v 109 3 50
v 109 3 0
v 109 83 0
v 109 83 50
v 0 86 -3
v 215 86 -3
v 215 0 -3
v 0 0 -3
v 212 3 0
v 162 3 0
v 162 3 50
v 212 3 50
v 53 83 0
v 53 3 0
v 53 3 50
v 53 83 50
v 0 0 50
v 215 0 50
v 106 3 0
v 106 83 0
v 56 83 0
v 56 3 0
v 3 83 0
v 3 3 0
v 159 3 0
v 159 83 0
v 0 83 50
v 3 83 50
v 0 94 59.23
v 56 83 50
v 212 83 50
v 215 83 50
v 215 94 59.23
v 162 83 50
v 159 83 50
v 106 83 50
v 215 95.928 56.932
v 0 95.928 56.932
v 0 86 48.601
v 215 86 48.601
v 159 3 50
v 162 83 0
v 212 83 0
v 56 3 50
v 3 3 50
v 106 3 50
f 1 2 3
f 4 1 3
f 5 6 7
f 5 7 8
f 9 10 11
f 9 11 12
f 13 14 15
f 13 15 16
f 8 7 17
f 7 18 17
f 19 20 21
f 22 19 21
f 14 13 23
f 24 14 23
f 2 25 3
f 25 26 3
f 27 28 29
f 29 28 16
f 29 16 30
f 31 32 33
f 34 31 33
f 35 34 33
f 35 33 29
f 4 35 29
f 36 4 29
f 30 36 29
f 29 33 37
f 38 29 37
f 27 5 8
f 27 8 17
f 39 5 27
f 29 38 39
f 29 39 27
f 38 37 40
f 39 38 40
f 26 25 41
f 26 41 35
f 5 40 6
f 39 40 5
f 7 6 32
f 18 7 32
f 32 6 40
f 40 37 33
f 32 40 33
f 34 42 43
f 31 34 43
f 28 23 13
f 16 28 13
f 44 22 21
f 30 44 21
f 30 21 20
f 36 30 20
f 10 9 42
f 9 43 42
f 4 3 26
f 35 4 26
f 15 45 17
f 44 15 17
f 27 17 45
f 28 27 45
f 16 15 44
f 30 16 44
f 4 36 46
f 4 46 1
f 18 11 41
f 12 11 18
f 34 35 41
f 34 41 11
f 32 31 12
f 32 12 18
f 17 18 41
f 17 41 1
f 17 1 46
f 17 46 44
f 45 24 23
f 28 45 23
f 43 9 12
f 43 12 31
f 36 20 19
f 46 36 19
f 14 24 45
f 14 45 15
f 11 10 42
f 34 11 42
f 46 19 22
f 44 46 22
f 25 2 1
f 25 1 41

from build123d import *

# Parameters (mm, degrees)
ESBO_O1_W                = 50
ESBO_O1_H                = 80
RESSALTO_EXTRUS_O1_DEPTH = 50
ESBO_O2_W                = 215
ESBO_O2_H                = 86
RESSALTO_EXTRUS_O2_DEPTH = 3
RESSALTO_EXTRUS_O3_DEPTH = 215


with BuildPart() as part:
    # Esboço1 → Ressalto-extrusão1 (new body)
    # profile 1 of 2: a face of its own
    with BuildSketch(Plane.XY):
        Polygon((53, 86), (0, 86), (0, 0), (53, 0), (56, 0), (56, 3), (56, 83), (56, 86), align=None)
        with Locations((28, 43)):
            Rectangle(ESBO_O1_W, ESBO_O1_H, mode=Mode.SUBTRACT)
    # profile 2 of 2: a face of its own
    with BuildSketch(Plane.XY):
        Polygon((215, 86), (56, 86), (56, 83), (106, 83), (106, 3), (56, 3), (56, 0), (215, 0), (215, 3), (215, 83), align=None)
        with Locations((134, 43)):
            Rectangle(ESBO_O1_W, ESBO_O1_H, mode=Mode.SUBTRACT)
        with Locations((187, 43)):
            Rectangle(ESBO_O1_W, ESBO_O1_H, mode=Mode.SUBTRACT)
    extrude(amount=RESSALTO_EXTRUS_O1_DEPTH)

    # Esboço2 → Ressalto-extrusão2 (add)
    with BuildSketch(Plane(origin=(0, 0, 0), x_dir=(-1, 0, 0), z_dir=(0, 0, -1))):
        with Locations((-107.5, 43)):
            Rectangle(ESBO_O2_W, ESBO_O2_H)
    extrude(amount=RESSALTO_EXTRUS_O2_DEPTH)

    # Esboço4 → Ressalto-extrusão3 (add)
    with BuildSketch(Plane(origin=(215, 0, 0), x_dir=(0, 0, -1), z_dir=(1, 0, 0))):
        Polygon((-59.230095943, 94), (-56.931962614, 95.928362829), (-48.601077026, 86), (-50, 86), (-50, 83), align=None)
    extrude(amount=-RESSALTO_EXTRUS_O3_DEPTH)


solid = part.part
